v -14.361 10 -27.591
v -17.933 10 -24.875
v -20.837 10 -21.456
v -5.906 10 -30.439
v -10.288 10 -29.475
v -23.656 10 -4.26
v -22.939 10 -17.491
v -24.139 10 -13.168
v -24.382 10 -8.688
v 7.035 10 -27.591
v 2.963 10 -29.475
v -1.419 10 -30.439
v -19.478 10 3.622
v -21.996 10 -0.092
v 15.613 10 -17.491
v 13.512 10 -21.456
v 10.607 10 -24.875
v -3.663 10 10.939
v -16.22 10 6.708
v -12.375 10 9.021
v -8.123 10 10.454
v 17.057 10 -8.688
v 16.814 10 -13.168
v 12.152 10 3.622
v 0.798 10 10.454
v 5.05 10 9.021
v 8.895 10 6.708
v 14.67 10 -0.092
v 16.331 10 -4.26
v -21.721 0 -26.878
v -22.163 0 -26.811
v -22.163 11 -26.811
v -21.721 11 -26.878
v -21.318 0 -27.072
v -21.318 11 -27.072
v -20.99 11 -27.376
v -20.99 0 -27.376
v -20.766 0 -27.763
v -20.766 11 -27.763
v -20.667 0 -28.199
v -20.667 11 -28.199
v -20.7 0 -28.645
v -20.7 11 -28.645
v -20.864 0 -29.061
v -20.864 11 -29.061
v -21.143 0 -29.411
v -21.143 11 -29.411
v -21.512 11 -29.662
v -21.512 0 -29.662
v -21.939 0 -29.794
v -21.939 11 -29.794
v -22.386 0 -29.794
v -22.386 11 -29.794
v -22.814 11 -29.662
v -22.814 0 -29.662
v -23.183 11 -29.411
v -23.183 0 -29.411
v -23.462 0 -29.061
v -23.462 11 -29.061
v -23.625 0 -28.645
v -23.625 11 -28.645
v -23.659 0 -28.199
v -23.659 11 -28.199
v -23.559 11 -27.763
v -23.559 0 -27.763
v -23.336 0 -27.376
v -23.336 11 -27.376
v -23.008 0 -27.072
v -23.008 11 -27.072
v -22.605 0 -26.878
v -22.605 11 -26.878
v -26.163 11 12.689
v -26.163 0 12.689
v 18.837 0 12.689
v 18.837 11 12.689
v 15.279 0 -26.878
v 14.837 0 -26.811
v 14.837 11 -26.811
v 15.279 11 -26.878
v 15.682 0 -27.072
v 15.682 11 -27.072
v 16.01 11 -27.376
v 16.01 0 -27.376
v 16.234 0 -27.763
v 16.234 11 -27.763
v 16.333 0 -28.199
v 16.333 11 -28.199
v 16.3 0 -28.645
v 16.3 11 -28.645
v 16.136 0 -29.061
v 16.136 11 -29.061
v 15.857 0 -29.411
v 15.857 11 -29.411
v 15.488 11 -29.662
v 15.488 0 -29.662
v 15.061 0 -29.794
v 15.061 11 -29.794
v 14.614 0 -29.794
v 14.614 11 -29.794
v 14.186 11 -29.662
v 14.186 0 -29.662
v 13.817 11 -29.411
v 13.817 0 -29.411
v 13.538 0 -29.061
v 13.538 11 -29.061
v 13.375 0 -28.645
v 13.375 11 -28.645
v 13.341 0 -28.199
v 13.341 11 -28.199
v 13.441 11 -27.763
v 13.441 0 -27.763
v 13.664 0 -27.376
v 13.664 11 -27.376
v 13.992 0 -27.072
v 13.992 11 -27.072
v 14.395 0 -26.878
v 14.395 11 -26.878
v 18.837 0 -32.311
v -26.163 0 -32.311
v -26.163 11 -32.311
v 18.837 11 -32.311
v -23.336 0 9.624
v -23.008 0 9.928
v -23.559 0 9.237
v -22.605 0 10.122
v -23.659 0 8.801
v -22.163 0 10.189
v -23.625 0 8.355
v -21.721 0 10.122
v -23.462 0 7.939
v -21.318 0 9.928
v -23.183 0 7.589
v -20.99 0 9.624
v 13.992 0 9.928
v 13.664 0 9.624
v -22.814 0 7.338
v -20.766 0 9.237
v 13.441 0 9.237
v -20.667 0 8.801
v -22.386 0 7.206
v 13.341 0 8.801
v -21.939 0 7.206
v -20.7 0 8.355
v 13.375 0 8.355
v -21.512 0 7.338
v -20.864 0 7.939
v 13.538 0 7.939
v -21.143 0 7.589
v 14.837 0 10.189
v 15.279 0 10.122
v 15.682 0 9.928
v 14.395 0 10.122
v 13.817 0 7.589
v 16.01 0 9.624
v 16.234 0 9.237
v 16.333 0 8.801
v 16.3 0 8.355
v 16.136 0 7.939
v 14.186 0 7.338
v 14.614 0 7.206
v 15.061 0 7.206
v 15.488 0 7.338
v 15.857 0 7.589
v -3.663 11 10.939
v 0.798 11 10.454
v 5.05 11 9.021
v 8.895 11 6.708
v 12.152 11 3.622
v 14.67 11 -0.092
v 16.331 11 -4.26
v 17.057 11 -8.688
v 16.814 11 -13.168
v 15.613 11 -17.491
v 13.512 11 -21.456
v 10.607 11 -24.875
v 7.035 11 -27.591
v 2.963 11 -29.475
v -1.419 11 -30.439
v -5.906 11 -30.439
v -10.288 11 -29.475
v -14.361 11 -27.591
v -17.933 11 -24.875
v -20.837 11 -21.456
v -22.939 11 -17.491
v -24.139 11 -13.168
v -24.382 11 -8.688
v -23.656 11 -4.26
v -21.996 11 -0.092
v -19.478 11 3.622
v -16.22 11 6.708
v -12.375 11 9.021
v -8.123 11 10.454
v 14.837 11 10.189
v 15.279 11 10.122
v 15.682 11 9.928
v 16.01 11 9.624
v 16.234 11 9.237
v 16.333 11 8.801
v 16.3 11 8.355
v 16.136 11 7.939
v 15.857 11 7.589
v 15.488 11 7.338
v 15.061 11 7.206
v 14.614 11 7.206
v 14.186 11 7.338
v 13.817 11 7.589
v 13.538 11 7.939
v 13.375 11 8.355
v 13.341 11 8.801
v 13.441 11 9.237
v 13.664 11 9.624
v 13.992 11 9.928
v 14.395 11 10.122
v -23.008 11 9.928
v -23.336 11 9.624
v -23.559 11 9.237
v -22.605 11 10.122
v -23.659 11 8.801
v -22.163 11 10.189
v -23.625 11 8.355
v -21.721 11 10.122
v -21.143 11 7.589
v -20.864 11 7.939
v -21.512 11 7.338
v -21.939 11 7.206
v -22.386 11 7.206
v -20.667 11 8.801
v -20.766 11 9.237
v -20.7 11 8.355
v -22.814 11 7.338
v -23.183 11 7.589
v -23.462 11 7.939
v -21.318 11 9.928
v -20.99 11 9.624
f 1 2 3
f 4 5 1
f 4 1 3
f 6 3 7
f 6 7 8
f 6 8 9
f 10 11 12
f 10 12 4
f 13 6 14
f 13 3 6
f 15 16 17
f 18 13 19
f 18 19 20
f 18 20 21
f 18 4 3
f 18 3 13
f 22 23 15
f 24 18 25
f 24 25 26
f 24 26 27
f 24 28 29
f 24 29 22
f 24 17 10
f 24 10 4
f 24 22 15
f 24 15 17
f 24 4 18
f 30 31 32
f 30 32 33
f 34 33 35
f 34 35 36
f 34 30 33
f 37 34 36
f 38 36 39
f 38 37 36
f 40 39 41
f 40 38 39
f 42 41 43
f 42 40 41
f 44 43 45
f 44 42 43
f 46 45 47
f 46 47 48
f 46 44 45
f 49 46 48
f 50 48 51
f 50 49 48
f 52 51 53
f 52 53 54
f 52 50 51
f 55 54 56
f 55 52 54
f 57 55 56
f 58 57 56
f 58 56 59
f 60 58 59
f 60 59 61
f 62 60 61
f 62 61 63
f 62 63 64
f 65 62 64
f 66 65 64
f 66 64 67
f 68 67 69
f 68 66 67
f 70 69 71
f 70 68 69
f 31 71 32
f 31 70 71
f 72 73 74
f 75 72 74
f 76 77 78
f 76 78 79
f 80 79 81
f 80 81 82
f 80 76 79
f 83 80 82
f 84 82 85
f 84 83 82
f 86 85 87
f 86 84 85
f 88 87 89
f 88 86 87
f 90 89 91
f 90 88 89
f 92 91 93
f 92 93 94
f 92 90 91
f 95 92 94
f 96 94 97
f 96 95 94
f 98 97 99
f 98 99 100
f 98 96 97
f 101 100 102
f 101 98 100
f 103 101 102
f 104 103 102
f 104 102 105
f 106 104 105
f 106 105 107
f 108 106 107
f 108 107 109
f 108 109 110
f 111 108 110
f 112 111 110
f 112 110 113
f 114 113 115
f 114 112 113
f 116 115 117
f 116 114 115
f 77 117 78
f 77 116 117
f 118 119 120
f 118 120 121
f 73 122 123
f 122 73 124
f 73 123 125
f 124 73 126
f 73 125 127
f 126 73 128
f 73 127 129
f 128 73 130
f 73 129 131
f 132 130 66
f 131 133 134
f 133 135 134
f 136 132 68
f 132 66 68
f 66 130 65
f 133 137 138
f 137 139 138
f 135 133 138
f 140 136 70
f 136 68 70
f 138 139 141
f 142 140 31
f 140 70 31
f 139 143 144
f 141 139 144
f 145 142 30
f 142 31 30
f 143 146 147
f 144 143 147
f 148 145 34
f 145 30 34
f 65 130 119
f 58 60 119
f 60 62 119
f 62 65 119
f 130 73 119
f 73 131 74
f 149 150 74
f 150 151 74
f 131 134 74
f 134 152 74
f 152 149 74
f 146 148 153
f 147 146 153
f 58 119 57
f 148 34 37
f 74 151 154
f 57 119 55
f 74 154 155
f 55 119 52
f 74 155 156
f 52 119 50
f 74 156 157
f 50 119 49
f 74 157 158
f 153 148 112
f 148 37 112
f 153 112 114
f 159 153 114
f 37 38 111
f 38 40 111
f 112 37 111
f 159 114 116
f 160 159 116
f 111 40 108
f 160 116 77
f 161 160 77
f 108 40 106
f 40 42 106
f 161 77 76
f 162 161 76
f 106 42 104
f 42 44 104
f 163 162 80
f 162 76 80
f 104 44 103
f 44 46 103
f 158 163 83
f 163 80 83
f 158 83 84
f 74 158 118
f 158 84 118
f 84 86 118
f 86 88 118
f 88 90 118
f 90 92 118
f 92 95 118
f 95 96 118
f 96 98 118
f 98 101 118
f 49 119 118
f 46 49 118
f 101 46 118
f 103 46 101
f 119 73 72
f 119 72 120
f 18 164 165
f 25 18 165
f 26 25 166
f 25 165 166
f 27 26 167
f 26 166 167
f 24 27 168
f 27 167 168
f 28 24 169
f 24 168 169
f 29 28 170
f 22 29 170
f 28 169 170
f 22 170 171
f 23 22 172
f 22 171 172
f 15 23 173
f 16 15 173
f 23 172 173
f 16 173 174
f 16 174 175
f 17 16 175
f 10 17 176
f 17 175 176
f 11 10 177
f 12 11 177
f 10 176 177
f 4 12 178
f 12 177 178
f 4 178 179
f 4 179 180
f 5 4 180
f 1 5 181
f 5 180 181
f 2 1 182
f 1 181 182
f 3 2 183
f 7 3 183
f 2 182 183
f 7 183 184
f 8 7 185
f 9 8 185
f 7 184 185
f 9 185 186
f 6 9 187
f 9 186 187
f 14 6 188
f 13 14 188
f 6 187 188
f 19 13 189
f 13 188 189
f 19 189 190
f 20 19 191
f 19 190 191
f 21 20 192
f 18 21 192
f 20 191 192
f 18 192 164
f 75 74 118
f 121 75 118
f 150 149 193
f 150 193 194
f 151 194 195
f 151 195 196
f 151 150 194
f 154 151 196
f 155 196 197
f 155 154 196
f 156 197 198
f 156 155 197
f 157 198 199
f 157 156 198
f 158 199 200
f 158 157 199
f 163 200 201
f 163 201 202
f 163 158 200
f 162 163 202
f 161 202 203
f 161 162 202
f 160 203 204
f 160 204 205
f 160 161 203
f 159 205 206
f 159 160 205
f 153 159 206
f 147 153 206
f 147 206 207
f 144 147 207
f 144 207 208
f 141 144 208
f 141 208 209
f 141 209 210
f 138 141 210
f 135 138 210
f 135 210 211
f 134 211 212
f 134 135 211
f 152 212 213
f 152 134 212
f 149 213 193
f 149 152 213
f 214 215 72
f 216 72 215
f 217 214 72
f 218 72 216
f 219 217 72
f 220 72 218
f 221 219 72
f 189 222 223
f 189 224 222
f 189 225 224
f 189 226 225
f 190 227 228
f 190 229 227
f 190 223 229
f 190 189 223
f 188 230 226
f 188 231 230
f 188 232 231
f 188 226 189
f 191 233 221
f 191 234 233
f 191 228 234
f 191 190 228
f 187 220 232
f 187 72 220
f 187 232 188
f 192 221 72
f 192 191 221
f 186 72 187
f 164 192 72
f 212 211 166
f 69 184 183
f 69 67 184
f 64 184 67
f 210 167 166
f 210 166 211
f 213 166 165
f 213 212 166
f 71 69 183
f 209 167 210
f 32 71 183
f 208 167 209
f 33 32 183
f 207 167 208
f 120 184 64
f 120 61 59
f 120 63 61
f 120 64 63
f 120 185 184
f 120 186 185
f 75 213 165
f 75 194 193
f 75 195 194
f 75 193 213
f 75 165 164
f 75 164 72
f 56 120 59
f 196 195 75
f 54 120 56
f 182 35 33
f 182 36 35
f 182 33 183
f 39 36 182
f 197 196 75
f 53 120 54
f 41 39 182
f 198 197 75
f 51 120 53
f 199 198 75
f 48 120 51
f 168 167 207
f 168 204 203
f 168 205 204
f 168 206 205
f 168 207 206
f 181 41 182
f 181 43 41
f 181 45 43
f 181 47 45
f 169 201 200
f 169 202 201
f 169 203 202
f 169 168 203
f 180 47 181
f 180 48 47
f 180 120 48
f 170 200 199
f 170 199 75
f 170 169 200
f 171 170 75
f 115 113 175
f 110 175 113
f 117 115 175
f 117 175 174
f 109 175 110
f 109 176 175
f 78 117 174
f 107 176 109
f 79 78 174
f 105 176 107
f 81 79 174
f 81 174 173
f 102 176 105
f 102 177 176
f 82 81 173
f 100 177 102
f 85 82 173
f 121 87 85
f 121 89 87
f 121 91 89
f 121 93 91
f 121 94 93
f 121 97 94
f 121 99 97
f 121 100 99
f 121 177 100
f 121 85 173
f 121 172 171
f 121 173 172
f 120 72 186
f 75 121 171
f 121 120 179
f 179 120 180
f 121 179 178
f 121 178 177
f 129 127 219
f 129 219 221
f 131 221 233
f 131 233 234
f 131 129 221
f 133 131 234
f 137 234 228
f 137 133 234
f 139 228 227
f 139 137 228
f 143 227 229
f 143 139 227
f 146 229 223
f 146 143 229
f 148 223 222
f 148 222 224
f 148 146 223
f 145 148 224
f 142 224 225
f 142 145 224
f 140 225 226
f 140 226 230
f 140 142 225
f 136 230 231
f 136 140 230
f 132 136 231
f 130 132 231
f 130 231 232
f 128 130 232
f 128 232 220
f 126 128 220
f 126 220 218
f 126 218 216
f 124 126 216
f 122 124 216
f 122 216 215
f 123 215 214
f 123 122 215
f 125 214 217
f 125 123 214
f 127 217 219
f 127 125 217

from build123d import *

# Parameters (mm, degrees)
SKETCH1_W           = 45
SKETCH1_H           = 45
SKETCH1_R           = 1.5
BOSS_EXTRUDE1_DEPTH = 11
SKETCH2_R           = 20.75
CUT_EXTRUDE1_DEPTH  = 1


with BuildPart() as part:
    # Sketch1 → Boss-Extrude1 (new body)
    with BuildSketch(Plane(origin=(0, 0, 0), x_dir=(1, 0, 0), z_dir=(0, 1, 0))):
        with Locations((-3.662790698, 9.811046512)):
            Rectangle(SKETCH1_W, SKETCH1_H)
        with Locations(Location((-22.162790698, 28.311046512, 0), (0, 0, 270))):
            Circle(SKETCH1_R, mode=Mode.SUBTRACT)
        with Locations(Location((14.837209302, 28.311046512, 0), (0, 0, 270))):
            Circle(SKETCH1_R, mode=Mode.SUBTRACT)
        with Locations(Location((-22.162790698, -8.688953488, 0), (0, 0, 270))):
            Circle(SKETCH1_R, mode=Mode.SUBTRACT)
        with Locations(Location((14.837209302, -8.688953488, 0), (0, 0, 270))):
            Circle(SKETCH1_R, mode=Mode.SUBTRACT)
    extrude(amount=BOSS_EXTRUDE1_DEPTH)

    # Sketch2 → Cut-Extrude1 (cut)
    with BuildSketch(Plane(origin=(0, 11, 0), x_dir=(1, 0, 0), z_dir=(0, 1, 0))):
        with Locations(Location((-3.662790698, 9.811046512, 0), (0, 0, 270))):
            Circle(SKETCH2_R)
    extrude(amount=-CUT_EXTRUDE1_DEPTH, mode=Mode.SUBTRACT)


solid = part.part
